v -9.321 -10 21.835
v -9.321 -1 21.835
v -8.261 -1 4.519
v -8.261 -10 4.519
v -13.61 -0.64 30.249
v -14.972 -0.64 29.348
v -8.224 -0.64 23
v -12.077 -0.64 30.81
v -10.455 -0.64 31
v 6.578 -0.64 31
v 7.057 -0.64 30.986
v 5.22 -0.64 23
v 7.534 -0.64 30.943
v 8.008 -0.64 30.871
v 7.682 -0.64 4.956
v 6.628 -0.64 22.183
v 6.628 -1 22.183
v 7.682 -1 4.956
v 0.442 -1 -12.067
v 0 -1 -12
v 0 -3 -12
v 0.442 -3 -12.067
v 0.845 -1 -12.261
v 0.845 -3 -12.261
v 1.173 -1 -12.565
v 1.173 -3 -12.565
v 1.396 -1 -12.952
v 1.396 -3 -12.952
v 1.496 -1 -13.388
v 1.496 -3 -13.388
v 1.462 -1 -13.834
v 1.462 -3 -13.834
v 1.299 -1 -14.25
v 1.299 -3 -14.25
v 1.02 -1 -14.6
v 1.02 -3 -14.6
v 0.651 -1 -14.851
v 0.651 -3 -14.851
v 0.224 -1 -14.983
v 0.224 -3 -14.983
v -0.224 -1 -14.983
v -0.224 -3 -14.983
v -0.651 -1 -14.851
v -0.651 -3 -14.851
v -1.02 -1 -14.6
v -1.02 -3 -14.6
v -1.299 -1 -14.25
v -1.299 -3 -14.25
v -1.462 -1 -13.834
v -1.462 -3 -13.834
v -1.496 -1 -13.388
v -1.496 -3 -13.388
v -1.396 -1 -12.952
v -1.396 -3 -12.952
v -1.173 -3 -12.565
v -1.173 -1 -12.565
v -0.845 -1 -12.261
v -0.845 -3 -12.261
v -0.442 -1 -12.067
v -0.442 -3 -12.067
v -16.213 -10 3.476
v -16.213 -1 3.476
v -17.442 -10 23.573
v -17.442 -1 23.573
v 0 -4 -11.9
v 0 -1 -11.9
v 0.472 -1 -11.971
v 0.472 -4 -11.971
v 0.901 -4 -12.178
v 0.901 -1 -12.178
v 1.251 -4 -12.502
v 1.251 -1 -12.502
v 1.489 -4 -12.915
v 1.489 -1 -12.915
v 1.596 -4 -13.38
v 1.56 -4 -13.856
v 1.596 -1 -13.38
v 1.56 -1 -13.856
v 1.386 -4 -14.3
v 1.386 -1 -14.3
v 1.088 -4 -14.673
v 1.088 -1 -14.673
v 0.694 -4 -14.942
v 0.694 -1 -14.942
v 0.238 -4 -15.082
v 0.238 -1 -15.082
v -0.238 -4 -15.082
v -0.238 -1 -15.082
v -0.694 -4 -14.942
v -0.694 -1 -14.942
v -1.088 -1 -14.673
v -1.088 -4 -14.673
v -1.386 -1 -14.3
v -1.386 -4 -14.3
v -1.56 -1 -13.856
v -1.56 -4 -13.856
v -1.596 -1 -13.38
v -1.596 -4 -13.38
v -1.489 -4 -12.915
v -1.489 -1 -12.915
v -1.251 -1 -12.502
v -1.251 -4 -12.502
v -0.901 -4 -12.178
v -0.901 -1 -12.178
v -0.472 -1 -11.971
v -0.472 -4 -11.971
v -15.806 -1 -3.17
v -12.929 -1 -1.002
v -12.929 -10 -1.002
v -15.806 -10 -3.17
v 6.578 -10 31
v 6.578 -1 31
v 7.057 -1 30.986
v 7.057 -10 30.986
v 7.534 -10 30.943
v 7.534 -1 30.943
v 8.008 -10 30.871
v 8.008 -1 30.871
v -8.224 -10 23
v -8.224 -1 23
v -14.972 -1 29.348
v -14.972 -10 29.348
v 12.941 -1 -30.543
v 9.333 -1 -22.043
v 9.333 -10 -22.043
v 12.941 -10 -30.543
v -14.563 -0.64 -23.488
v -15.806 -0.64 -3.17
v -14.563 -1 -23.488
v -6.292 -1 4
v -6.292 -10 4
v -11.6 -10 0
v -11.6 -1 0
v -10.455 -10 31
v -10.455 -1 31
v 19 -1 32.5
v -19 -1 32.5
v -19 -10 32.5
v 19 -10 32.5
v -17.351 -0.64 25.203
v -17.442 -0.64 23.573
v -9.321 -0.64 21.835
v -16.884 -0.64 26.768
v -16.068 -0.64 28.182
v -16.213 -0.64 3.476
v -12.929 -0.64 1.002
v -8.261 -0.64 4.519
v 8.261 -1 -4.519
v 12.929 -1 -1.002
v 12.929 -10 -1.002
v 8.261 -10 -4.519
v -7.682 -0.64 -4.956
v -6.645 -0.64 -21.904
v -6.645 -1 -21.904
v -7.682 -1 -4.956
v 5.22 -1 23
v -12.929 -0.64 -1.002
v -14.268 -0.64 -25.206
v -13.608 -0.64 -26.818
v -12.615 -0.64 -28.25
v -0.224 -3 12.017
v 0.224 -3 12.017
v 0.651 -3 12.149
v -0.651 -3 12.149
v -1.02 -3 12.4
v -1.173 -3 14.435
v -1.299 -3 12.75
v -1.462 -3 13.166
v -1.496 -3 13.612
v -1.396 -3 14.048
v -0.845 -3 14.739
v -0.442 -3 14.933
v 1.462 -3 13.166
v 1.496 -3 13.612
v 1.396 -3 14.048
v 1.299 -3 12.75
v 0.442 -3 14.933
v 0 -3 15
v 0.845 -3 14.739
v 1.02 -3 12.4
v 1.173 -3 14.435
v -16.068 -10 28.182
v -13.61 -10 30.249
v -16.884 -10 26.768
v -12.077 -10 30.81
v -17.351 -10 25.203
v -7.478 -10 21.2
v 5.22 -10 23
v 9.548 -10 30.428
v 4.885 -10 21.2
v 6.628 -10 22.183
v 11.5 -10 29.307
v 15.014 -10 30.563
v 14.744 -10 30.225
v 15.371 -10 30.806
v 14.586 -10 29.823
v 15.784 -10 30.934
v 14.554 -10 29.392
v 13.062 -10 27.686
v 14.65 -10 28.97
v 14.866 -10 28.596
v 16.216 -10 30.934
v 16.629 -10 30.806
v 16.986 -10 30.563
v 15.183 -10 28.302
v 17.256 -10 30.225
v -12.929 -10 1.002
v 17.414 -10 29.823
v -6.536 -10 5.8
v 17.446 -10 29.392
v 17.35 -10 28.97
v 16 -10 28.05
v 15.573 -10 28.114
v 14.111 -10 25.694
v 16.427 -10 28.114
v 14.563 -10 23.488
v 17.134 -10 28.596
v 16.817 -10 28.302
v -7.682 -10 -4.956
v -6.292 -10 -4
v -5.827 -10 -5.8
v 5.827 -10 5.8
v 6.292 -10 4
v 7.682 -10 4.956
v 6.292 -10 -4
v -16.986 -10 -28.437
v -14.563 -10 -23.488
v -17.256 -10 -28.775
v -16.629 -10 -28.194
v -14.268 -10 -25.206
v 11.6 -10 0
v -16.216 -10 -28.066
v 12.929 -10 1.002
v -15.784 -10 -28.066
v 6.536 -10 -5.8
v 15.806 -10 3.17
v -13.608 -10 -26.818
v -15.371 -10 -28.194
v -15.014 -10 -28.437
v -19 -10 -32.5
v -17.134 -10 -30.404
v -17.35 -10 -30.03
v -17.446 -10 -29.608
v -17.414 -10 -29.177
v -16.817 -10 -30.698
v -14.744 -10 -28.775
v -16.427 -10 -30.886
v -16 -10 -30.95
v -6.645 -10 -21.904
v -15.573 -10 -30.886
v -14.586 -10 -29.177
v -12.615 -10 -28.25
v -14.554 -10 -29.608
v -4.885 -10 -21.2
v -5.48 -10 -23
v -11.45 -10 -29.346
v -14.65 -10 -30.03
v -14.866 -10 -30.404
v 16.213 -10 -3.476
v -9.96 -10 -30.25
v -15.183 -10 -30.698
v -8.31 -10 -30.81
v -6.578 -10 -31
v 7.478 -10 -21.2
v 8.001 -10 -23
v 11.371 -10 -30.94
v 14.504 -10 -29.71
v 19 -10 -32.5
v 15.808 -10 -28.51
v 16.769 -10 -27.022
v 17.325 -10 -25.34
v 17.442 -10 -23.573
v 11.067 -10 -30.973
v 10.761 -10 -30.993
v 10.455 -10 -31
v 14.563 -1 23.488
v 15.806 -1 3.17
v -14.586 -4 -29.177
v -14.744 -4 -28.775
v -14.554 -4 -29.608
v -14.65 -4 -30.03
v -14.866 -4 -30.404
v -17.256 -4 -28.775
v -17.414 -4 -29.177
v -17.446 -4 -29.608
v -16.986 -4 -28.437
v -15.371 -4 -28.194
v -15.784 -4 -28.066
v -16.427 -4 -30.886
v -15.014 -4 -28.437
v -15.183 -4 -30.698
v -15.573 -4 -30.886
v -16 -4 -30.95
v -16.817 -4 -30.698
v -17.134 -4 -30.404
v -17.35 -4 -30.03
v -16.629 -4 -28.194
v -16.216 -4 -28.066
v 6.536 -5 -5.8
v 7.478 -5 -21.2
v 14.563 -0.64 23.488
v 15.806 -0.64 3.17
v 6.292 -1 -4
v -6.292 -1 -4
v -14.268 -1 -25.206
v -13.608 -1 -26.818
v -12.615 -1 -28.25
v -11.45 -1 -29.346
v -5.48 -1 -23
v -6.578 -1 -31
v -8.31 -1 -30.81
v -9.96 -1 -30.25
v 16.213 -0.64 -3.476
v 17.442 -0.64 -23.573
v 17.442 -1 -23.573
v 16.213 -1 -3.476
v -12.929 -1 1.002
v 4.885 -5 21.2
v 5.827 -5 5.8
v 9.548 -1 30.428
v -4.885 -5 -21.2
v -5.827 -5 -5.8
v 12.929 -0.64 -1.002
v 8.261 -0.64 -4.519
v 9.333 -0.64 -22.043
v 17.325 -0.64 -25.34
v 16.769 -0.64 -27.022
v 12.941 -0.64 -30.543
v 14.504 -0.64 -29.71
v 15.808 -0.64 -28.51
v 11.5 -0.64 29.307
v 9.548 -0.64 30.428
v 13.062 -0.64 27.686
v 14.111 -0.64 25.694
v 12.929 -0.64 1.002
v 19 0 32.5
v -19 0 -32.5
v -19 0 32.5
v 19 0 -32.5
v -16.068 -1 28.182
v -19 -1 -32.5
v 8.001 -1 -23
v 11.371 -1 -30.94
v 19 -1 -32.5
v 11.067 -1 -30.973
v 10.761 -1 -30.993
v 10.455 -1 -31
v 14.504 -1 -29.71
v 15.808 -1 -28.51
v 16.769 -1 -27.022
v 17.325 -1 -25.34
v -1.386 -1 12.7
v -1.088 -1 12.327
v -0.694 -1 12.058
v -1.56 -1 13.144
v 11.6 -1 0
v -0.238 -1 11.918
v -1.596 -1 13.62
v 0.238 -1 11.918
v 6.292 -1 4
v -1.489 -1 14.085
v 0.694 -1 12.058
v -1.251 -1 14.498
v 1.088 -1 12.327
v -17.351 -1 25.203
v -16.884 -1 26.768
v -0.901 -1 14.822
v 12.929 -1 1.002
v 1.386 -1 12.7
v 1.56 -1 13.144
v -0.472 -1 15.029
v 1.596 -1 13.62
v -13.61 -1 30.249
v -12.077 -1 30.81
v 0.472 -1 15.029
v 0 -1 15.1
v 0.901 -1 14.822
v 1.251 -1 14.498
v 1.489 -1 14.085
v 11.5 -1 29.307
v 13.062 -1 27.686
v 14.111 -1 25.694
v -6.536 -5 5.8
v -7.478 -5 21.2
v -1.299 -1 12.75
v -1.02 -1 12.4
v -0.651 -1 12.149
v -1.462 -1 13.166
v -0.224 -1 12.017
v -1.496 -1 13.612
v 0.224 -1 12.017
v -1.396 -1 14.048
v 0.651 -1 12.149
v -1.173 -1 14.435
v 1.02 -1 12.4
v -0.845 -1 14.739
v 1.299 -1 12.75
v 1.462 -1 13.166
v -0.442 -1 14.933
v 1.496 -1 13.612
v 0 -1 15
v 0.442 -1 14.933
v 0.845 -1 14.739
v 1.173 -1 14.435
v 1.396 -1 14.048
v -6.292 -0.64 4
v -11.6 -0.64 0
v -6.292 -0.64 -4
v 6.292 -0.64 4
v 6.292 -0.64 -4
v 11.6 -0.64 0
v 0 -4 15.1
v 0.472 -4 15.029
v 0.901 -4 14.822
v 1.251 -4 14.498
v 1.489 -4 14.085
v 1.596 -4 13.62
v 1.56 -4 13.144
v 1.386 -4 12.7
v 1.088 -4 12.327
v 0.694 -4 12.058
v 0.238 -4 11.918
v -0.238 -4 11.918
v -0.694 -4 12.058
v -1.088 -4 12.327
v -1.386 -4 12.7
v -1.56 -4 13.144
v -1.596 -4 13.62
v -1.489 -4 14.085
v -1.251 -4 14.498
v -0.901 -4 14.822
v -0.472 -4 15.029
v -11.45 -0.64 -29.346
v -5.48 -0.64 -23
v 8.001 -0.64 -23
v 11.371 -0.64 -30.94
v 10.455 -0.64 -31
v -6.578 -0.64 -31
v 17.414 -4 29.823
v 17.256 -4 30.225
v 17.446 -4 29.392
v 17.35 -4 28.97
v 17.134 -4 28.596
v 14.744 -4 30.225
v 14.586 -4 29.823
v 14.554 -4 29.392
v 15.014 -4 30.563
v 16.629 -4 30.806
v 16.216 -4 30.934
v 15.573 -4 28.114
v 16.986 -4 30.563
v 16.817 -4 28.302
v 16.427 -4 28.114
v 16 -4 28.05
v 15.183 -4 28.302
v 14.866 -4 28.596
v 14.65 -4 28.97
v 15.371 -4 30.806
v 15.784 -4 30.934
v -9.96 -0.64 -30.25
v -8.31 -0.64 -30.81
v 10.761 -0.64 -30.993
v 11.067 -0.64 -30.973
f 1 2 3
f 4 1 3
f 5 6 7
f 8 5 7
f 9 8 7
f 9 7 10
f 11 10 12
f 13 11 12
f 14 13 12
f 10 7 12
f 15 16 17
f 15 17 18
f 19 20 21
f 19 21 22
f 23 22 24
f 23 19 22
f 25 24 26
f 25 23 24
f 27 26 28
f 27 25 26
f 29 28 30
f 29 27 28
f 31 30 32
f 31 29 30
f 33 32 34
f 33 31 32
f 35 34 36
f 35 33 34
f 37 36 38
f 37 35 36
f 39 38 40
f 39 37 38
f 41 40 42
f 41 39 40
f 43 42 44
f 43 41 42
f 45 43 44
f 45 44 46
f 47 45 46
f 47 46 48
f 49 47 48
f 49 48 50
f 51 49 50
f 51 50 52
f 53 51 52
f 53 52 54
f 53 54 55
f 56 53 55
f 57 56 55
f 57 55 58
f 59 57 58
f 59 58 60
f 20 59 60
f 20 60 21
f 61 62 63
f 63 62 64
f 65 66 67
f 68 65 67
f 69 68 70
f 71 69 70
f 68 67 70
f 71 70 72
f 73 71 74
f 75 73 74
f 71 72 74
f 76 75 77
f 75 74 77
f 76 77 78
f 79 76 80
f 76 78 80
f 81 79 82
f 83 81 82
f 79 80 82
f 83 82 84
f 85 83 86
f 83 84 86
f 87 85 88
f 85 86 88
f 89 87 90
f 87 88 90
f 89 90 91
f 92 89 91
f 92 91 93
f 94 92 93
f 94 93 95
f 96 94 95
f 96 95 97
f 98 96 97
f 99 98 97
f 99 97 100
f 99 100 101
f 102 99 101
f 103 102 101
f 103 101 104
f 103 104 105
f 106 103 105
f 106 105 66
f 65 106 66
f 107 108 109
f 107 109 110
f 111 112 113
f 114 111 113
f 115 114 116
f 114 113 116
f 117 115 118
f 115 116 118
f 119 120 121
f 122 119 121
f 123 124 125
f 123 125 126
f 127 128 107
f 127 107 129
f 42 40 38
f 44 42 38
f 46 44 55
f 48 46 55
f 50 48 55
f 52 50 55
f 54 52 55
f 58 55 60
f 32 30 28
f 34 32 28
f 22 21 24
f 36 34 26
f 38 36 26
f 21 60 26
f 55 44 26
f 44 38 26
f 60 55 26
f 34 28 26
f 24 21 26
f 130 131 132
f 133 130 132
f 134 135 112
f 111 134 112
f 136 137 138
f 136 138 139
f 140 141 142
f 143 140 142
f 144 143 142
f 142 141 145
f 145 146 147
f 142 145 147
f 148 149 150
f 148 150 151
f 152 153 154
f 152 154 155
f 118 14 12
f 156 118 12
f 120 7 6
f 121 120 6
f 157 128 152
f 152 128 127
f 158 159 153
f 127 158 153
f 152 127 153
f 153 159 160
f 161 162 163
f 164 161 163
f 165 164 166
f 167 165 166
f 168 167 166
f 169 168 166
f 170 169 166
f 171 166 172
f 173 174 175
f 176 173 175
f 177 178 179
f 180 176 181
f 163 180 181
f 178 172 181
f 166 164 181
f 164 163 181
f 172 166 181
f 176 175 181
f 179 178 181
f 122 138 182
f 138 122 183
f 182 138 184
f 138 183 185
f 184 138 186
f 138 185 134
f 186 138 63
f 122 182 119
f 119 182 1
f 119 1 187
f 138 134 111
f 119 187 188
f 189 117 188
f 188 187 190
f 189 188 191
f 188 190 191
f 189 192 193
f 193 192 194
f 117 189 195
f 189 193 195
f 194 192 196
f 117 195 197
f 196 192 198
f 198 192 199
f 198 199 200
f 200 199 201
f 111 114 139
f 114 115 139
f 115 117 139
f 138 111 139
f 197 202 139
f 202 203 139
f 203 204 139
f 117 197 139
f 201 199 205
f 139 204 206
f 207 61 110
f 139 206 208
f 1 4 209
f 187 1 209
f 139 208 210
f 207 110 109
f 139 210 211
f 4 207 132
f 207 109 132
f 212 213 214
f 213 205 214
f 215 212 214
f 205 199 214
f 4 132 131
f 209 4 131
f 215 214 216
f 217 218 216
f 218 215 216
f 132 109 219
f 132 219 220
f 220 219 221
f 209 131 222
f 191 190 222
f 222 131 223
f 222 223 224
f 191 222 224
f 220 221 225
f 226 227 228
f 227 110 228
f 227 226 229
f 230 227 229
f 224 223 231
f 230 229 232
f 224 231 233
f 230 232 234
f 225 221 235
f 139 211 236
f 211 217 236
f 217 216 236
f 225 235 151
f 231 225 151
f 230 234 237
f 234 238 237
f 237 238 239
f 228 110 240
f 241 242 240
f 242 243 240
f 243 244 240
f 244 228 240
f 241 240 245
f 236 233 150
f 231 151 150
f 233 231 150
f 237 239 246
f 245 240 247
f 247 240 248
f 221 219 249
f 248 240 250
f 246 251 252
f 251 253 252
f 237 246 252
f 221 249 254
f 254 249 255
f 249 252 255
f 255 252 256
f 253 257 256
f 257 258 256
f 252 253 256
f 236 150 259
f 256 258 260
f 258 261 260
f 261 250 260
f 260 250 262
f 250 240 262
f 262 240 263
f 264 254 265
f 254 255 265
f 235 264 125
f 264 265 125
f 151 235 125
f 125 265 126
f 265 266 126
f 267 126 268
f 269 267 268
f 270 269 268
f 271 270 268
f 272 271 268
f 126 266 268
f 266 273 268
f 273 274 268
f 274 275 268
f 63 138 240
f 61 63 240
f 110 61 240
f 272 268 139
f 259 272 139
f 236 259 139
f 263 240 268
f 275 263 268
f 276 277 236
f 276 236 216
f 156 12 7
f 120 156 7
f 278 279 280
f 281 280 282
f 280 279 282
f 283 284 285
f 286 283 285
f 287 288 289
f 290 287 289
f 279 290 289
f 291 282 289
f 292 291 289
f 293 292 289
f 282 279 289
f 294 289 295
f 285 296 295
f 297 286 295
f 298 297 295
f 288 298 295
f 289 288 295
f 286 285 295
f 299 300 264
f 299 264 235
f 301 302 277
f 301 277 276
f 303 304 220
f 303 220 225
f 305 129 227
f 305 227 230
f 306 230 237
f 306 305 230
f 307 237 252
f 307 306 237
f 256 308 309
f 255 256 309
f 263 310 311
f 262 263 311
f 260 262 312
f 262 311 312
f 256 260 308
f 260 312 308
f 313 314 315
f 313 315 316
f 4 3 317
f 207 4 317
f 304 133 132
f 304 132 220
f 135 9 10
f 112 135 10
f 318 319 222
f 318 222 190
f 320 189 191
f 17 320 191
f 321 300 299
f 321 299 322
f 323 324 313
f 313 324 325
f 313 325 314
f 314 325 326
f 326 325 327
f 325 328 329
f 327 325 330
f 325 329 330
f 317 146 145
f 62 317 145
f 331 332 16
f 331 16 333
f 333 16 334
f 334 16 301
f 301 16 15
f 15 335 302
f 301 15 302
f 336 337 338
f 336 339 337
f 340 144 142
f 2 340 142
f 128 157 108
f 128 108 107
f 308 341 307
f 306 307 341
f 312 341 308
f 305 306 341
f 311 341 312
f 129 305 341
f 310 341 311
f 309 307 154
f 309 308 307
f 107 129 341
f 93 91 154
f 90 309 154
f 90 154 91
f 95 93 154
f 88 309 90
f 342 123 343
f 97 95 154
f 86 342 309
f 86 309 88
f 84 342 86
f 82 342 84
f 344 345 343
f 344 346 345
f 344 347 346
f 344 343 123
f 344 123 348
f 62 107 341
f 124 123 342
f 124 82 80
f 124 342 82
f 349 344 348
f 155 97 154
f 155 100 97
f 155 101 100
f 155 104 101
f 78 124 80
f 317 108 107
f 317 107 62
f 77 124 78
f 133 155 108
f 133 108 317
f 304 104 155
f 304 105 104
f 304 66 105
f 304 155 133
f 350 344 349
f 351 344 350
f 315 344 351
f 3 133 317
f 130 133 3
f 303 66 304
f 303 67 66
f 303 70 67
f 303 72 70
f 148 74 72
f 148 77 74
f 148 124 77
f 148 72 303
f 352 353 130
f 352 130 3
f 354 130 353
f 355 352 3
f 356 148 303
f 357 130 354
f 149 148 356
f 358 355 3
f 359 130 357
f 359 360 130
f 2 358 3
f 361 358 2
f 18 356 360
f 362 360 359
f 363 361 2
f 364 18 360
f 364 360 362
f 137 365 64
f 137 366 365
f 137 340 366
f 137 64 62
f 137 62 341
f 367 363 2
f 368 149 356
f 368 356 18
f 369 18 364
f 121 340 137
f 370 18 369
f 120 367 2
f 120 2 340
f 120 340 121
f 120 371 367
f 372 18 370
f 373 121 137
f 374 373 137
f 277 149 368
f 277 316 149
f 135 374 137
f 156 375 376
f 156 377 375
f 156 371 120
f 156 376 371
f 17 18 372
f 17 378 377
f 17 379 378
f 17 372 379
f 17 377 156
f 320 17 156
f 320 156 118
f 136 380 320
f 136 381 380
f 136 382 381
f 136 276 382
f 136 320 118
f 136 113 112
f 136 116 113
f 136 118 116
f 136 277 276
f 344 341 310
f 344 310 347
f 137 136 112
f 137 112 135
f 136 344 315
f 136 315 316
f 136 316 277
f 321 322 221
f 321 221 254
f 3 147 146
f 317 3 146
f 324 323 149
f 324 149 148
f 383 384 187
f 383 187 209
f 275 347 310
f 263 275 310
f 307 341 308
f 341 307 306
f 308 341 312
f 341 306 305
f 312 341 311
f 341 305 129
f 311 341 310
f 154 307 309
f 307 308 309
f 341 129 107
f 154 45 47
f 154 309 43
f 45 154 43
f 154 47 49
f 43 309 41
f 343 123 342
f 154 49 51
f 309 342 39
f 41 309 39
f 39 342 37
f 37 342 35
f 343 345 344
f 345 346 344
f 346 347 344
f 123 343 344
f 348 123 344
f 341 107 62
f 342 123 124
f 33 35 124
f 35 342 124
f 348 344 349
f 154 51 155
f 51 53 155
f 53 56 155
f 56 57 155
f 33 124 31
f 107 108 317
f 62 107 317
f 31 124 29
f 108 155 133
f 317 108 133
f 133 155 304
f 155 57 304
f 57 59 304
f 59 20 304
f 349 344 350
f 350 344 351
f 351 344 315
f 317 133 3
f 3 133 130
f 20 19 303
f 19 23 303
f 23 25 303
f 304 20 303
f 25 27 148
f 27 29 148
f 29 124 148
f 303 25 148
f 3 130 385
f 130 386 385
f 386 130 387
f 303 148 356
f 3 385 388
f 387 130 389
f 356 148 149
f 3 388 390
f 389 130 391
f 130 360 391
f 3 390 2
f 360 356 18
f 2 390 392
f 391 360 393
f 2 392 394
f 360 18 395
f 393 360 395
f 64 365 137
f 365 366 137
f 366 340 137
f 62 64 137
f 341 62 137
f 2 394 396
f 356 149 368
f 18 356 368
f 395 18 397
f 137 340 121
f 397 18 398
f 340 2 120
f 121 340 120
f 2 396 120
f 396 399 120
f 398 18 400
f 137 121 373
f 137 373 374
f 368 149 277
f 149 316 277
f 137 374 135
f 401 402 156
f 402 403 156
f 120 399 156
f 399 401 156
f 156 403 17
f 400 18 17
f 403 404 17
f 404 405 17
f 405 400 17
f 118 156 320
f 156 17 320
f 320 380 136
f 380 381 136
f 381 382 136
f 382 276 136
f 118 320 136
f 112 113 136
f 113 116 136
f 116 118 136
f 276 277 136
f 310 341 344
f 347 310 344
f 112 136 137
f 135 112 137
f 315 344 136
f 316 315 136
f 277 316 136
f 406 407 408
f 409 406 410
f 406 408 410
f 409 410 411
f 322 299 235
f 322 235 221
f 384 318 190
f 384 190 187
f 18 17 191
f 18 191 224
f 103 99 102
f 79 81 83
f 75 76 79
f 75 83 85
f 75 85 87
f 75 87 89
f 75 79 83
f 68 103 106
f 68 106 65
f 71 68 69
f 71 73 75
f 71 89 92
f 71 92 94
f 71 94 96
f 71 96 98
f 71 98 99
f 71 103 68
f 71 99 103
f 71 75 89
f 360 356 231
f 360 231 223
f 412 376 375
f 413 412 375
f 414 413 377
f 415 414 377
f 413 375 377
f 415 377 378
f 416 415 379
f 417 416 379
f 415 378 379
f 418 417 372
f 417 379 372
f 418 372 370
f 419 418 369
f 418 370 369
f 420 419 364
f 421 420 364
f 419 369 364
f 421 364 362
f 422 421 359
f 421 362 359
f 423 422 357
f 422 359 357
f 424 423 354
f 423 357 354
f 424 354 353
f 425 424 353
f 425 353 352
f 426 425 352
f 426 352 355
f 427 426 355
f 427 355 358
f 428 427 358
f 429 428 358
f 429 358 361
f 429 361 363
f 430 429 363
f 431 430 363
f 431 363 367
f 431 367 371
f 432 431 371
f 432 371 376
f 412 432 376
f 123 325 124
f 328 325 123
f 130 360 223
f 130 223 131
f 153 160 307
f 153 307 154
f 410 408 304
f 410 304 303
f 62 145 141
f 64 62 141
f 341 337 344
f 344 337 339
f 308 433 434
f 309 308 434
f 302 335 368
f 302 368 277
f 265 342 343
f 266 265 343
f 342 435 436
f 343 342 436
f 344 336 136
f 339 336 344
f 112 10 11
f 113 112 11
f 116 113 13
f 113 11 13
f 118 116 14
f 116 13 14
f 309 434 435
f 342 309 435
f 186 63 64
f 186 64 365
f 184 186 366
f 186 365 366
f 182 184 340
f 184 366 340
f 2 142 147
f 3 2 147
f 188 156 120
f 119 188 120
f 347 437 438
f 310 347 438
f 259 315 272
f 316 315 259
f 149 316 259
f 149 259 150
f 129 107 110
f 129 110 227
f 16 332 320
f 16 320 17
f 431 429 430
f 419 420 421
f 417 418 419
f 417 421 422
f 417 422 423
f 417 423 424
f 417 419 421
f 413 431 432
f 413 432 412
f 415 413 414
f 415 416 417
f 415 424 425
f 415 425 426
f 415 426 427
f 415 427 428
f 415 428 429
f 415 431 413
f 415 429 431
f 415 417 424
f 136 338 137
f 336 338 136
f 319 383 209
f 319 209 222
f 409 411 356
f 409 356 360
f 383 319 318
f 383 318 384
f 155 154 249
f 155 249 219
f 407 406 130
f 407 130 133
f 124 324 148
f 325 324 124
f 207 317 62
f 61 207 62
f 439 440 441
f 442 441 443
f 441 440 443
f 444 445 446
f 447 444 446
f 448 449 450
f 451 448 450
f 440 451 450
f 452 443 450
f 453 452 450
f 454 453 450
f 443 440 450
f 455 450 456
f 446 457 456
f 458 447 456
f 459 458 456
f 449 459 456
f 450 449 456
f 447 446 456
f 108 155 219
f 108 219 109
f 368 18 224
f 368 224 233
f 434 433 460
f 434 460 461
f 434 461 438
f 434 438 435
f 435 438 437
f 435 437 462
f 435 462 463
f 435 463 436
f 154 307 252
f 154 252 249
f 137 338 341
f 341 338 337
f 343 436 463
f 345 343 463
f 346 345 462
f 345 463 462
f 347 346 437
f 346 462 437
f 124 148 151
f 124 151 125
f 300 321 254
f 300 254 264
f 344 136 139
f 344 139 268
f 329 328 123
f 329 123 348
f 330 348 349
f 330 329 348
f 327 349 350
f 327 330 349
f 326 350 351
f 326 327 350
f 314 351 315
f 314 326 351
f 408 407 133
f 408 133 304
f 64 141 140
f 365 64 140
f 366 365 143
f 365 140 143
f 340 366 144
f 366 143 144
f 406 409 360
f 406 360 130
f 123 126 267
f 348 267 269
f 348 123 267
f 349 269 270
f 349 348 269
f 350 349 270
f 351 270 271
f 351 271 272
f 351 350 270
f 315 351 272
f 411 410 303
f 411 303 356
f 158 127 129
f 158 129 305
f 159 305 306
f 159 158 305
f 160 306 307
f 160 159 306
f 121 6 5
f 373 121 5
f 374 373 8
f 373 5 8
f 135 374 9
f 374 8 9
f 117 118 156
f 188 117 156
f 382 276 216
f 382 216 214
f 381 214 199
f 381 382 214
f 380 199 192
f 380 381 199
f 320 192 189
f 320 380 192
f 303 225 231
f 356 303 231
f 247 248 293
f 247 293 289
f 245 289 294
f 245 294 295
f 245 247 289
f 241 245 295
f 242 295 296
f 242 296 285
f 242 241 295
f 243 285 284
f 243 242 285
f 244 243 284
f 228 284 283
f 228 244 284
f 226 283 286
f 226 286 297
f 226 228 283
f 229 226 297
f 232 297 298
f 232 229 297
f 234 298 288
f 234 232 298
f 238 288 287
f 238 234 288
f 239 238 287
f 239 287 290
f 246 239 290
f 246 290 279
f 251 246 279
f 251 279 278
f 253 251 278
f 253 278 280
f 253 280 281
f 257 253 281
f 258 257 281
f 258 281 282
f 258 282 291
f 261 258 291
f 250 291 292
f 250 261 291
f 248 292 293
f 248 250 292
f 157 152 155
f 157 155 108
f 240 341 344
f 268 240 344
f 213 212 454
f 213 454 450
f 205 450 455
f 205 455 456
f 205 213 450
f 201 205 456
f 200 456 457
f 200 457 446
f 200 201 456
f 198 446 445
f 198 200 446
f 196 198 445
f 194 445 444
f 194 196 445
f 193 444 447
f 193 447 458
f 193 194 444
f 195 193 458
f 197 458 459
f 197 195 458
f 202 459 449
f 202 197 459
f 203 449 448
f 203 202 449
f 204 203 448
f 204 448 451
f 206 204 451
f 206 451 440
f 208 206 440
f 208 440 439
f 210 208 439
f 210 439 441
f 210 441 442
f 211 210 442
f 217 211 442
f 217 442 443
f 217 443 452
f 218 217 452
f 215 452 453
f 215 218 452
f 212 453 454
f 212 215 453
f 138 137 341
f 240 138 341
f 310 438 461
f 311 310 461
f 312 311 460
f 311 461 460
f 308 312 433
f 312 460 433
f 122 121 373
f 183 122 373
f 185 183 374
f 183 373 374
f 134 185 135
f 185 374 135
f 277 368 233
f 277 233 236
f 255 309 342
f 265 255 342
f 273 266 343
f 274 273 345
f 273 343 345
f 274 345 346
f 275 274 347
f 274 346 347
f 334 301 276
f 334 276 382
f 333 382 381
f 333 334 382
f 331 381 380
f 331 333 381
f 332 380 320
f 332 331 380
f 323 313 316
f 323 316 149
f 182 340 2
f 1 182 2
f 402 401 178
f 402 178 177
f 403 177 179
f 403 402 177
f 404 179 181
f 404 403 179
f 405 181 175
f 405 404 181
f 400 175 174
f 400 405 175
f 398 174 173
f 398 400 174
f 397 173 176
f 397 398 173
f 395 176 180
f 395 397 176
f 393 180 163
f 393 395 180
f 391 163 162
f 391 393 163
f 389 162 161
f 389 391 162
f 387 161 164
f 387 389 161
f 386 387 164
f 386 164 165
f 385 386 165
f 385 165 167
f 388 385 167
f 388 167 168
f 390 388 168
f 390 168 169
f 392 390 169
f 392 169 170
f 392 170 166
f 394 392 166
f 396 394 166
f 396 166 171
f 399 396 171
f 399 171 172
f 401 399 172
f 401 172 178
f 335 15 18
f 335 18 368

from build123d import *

# Parameters (mm, degrees)
SKETCH3_W           = 38
SKETCH3_H           = 65
BOSS_EXTRUDE1_DEPTH = 0.64
SKETCH3_3_W         = 38
SKETCH3_3_H         = 65
BOSS_EXTRUDE2_DEPTH = 10
SKETCH6_R           = 1.5
BOSS_EXTRUDE3_DEPTH = 3
SKETCH6_3_R         = 1.6
SKETCH6_3_R_2       = 1.5
CUT_EXTRUDE2_DEPTH  = 4
CUT_EXTRUDE1_START  = -10
SKETCH5_R           = 1.45
CUT_EXTRUDE1_DEPTH  = 6
CUT_EXTRUDE3_START  = -5
SKETCH6_4_R         = 1.6
SKETCH6_4_R_2       = 1.5
CUT_EXTRUDE3_DEPTH  = 5


with BuildPart() as part:
    # Sketch3 → Boss-Extrude1 (new body)
    with BuildSketch(Plane(origin=(0, 0, 0), x_dir=(1, 0, 0), z_dir=(0, 1, 0))):
        Rectangle(SKETCH3_W, SKETCH3_H)
    extrude(amount=-BOSS_EXTRUDE1_DEPTH)

    # Sketch3<3> → Boss-Extrude2 (add)
    with BuildSketch(Plane(origin=(0, 0, 0), x_dir=(1, 0, 0), z_dir=(0, 1, 0))):
        Rectangle(SKETCH3_3_W, SKETCH3_3_H)
        with BuildLine():
            Line((-15.806141704, 3.169555117), (-14.563388627, 23.488388316))
            ThreePointArc((-14.563388627, 23.488388316), (-13.982347964, 26.029888674), (-12.614994756, 28.249613324))
            Line((-12.614994756, 28.249613324), (-6.645362379, 21.903707215))
            Line((-6.645362379, 21.903707215), (-7.681935248, 4.955890615))
            Line((-7.681935248, 4.955890615), (-12.929312113, 1.001708527))
            Line((-12.929312113, 1.001708527), (-15.806141704, 3.169555117))
        make_face(mode=Mode.SUBTRACT)
        with BuildLine():
            Line((-11.449601204, 29.345906109), (-5.479968827, 23))
            Line((-5.479968827, 23), (8.001249484, 23))
            Line((8.001249484, 23), (11.371462409, 30.939724094))
            ThreePointArc((11.371462409, 30.939724094), (10.91413207, 30.984914769), (10.454822074, 31))
            Line((10.454822074, 31), (-6.57831024, 31))
            ThreePointArc((-6.57831024, 31), (-9.150541871, 30.57519798), (-11.449601204, 29.345906109))
        make_face(mode=Mode.SUBTRACT)
        Polygon((-11.6, 0), (-6.291820714, 4), (6.291820714, 4), (11.6, 0), (6.291820714, -4), (-6.291820714, -4), align=None, mode=Mode.SUBTRACT)
        with BuildLine():
            Line((9.333267306, 22.043149873), (12.941431756, 30.543452628))
            ThreePointArc((12.941431756, 30.543452628), (16.335726731, 27.796703889), (17.441765663, 23.572660223))
            Line((17.441765663, 23.572660223), (16.212591289, 3.475836847))
            Line((16.212591289, 3.475836847), (12.929312113, 1.001708527))
            Line((12.929312113, 1.001708527), (8.261456028, 4.519190384))
            Line((8.261456028, 4.519190384), (9.333267306, 22.043149873))
        make_face(mode=Mode.SUBTRACT)
        with BuildLine():
            Line((6.62830762, -22.182550065), (7.681935248, -4.955890615))
            Line((7.681935248, -4.955890615), (12.929312113, -1.001708527))
            Line((12.929312113, -1.001708527), (15.806141704, -3.169555117))
            Line((15.806141704, -3.169555117), (14.563388627, -23.488388316))
            ThreePointArc((14.563388627, -23.488388316), (13.062425539, -27.685749543), (9.548273172, -30.428278413))
            Line((9.548273172, -30.428278413), (6.62830762, -22.182550065))
        make_face(mode=Mode.SUBTRACT)
        with BuildLine():
            Line((8.007780574, -30.871252414), (5.220423905, -23))
            Line((5.220423905, -23), (-8.224219459, -23))
            Line((-8.224219459, -23), (-14.971866072, -29.347552106))
            ThreePointArc((-14.971866072, -29.347552106), (-12.859726985, -30.573920624), (-10.454822074, -31))
            Line((-10.454822074, -31), (6.57831024, -31))
            ThreePointArc((6.57831024, -31), (7.295938517, -30.967748092), (8.007780574, -30.871252414))
        make_face(mode=Mode.SUBTRACT)
        with BuildLine():
            Line((-16.068158856, -28.182158554), (-9.320512244, -21.834606448))
            Line((-9.320512244, -21.834606448), (-8.261456028, -4.519190384))
            Line((-8.261456028, -4.519190384), (-12.929312113, -1.001708527))
            Line((-12.929312113, -1.001708527), (-16.212591289, -3.475836847))
            Line((-16.212591289, -3.475836847), (-17.441765663, -23.572660223))
            ThreePointArc((-17.441765663, -23.572660223), (-17.163296944, -25.999091025), (-16.068158856, -28.182158554))
        make_face(mode=Mode.SUBTRACT)
    extrude(amount=-BOSS_EXTRUDE2_DEPTH)


with BuildPart() as body_2:
    # Split1: the piece on the far side of the plane
    add(part.part)
    split(bisect_by=Plane.ZX.offset(-1), keep=Keep.BOTTOM)

    # Sketch6<3> → Cut-Extrude2 (cut)
    # profile 1 of 4: a face of its own
    with BuildSketch(Plane(origin=(0, 0, 0), x_dir=(1, 0, 0), z_dir=(0, 1, 0))):
        with Locations(Location((0, 13.5, 0), (0, 0, 270))):
            Circle(SKETCH6_3_R)
        with Locations(Location((0, 13.5, 0), (0, 0, 270))):
            Circle(SKETCH6_3_R_2, mode=Mode.SUBTRACT)
    # profile 2 of 4: a face of its own
    with BuildSketch(Plane(origin=(0, 0, 0), x_dir=(1, 0, 0), z_dir=(0, 1, 0))):
        with Locations(Location((0, 13.5, 0), (0, 0, 270))):
            Circle(SKETCH6_3_R_2)
    # profile 3 of 4: a face of its own
    with BuildSketch(Plane(origin=(0, 0, 0), x_dir=(1, 0, 0), z_dir=(0, 1, 0))):
        with Locations(Location((0, -13.5, 0), (0, 0, 270))):
            Circle(SKETCH6_3_R)
        with Locations(Location((0, -13.5, 0), (0, 0, 270))):
            Circle(SKETCH6_3_R_2, mode=Mode.SUBTRACT)
    # profile 4 of 4: a face of its own
    with BuildSketch(Plane(origin=(0, 0, 0), x_dir=(1, 0, 0), z_dir=(0, 1, 0))):
        with Locations(Location((0, -13.5, 0), (0, 0, 270))):
            Circle(SKETCH6_3_R_2)
    extrude(amount=-CUT_EXTRUDE2_DEPTH, mode=Mode.SUBTRACT)

    # Sketch5 → Cut-Extrude1 (cut)
    with BuildSketch(Plane(origin=(0, 0, 0), x_dir=(1, 0, 0), z_dir=(0, 1, 0)).offset(CUT_EXTRUDE1_START)):
        with Locations(Location((-16, 29.5, 0), (0, 0, 90))):
            Circle(SKETCH5_R)
        with Locations(Location((16, -29.5, 0), (0, 0, 90))):
            Circle(SKETCH5_R)
    extrude(amount=CUT_EXTRUDE1_DEPTH, mode=Mode.SUBTRACT)

    # Sketch6<4> → Cut-Extrude3 (cut)
    # profile 1 of 6: a face of its own
    with BuildSketch(Plane(origin=(0, 0, 0), x_dir=(1, 0, 0), z_dir=(0, 1, 0)).offset(CUT_EXTRUDE3_START)):
        Polygon((7.478334414, 21.2), (6.536430064, 5.8), (-5.82694367, 5.8), (-4.88503932, 21.2), align=None)
        with Locations(Location((0, 13.5, 0), (0, 0, 270))):
            Circle(SKETCH6_4_R, mode=Mode.SUBTRACT)
    # profile 2 of 6: a face of its own
    with BuildSketch(Plane(origin=(0, 0, 0), x_dir=(1, 0, 0), z_dir=(0, 1, 0)).offset(CUT_EXTRUDE3_START)):
        with Locations(Location((0, 13.5, 0), (0, 0, 270))):
            Circle(SKETCH6_4_R)
        with Locations(Location((0, 13.5, 0), (0, 0, 270))):
            Circle(SKETCH6_4_R_2, mode=Mode.SUBTRACT)
    # profile 3 of 6: a face of its own
    with BuildSketch(Plane(origin=(0, 0, 0), x_dir=(1, 0, 0), z_dir=(0, 1, 0)).offset(CUT_EXTRUDE3_START)):
        with Locations(Location((0, 13.5, 0), (0, 0, 270))):
            Circle(SKETCH6_4_R_2)
    # profile 4 of 6: a face of its own
    with BuildSketch(Plane(origin=(0, 0, 0), x_dir=(1, 0, 0), z_dir=(0, 1, 0)).offset(CUT_EXTRUDE3_START)):
        Polygon((5.82694367, -5.8), (4.88503932, -21.2), (-7.478334414, -21.2), (-6.536430064, -5.8), align=None)
        with Locations(Location((0, -13.5, 0), (0, 0, 270))):
            Circle(SKETCH6_4_R, mode=Mode.SUBTRACT)
    # profile 5 of 6: a face of its own
    with BuildSketch(Plane(origin=(0, 0, 0), x_dir=(1, 0, 0), z_dir=(0, 1, 0)).offset(CUT_EXTRUDE3_START)):
        with Locations(Location((0, -13.5, 0), (0, 0, 270))):
            Circle(SKETCH6_4_R)
        with Locations(Location((0, -13.5, 0), (0, 0, 270))):
            Circle(SKETCH6_4_R_2, mode=Mode.SUBTRACT)
    # profile 6 of 6: a face of its own
    with BuildSketch(Plane(origin=(0, 0, 0), x_dir=(1, 0, 0), z_dir=(0, 1, 0)).offset(CUT_EXTRUDE3_START)):
        with Locations(Location((0, -13.5, 0), (0, 0, 270))):
            Circle(SKETCH6_4_R_2)
    extrude(amount=-CUT_EXTRUDE3_DEPTH, mode=Mode.SUBTRACT)


with BuildPart() as part_1:
    add(part.part)

    # Split1
    split(bisect_by=Plane.ZX.offset(-1), keep=Keep.TOP)

    # Sketch6 → Boss-Extrude3 (add)
    with BuildSketch(Plane(origin=(0, 0, 0), x_dir=(1, 0, 0), z_dir=(0, 1, 0))):
        with Locations(Location((0, 13.5, 0), (0, 0, 270))):
            Circle(SKETCH6_R)
        with Locations(Location((0, -13.5, 0), (0, 0, 270))):
            Circle(SKETCH6_R)
    extrude(amount=-BOSS_EXTRUDE3_DEPTH)


solid = Compound([body_2.part, part_1.part])
